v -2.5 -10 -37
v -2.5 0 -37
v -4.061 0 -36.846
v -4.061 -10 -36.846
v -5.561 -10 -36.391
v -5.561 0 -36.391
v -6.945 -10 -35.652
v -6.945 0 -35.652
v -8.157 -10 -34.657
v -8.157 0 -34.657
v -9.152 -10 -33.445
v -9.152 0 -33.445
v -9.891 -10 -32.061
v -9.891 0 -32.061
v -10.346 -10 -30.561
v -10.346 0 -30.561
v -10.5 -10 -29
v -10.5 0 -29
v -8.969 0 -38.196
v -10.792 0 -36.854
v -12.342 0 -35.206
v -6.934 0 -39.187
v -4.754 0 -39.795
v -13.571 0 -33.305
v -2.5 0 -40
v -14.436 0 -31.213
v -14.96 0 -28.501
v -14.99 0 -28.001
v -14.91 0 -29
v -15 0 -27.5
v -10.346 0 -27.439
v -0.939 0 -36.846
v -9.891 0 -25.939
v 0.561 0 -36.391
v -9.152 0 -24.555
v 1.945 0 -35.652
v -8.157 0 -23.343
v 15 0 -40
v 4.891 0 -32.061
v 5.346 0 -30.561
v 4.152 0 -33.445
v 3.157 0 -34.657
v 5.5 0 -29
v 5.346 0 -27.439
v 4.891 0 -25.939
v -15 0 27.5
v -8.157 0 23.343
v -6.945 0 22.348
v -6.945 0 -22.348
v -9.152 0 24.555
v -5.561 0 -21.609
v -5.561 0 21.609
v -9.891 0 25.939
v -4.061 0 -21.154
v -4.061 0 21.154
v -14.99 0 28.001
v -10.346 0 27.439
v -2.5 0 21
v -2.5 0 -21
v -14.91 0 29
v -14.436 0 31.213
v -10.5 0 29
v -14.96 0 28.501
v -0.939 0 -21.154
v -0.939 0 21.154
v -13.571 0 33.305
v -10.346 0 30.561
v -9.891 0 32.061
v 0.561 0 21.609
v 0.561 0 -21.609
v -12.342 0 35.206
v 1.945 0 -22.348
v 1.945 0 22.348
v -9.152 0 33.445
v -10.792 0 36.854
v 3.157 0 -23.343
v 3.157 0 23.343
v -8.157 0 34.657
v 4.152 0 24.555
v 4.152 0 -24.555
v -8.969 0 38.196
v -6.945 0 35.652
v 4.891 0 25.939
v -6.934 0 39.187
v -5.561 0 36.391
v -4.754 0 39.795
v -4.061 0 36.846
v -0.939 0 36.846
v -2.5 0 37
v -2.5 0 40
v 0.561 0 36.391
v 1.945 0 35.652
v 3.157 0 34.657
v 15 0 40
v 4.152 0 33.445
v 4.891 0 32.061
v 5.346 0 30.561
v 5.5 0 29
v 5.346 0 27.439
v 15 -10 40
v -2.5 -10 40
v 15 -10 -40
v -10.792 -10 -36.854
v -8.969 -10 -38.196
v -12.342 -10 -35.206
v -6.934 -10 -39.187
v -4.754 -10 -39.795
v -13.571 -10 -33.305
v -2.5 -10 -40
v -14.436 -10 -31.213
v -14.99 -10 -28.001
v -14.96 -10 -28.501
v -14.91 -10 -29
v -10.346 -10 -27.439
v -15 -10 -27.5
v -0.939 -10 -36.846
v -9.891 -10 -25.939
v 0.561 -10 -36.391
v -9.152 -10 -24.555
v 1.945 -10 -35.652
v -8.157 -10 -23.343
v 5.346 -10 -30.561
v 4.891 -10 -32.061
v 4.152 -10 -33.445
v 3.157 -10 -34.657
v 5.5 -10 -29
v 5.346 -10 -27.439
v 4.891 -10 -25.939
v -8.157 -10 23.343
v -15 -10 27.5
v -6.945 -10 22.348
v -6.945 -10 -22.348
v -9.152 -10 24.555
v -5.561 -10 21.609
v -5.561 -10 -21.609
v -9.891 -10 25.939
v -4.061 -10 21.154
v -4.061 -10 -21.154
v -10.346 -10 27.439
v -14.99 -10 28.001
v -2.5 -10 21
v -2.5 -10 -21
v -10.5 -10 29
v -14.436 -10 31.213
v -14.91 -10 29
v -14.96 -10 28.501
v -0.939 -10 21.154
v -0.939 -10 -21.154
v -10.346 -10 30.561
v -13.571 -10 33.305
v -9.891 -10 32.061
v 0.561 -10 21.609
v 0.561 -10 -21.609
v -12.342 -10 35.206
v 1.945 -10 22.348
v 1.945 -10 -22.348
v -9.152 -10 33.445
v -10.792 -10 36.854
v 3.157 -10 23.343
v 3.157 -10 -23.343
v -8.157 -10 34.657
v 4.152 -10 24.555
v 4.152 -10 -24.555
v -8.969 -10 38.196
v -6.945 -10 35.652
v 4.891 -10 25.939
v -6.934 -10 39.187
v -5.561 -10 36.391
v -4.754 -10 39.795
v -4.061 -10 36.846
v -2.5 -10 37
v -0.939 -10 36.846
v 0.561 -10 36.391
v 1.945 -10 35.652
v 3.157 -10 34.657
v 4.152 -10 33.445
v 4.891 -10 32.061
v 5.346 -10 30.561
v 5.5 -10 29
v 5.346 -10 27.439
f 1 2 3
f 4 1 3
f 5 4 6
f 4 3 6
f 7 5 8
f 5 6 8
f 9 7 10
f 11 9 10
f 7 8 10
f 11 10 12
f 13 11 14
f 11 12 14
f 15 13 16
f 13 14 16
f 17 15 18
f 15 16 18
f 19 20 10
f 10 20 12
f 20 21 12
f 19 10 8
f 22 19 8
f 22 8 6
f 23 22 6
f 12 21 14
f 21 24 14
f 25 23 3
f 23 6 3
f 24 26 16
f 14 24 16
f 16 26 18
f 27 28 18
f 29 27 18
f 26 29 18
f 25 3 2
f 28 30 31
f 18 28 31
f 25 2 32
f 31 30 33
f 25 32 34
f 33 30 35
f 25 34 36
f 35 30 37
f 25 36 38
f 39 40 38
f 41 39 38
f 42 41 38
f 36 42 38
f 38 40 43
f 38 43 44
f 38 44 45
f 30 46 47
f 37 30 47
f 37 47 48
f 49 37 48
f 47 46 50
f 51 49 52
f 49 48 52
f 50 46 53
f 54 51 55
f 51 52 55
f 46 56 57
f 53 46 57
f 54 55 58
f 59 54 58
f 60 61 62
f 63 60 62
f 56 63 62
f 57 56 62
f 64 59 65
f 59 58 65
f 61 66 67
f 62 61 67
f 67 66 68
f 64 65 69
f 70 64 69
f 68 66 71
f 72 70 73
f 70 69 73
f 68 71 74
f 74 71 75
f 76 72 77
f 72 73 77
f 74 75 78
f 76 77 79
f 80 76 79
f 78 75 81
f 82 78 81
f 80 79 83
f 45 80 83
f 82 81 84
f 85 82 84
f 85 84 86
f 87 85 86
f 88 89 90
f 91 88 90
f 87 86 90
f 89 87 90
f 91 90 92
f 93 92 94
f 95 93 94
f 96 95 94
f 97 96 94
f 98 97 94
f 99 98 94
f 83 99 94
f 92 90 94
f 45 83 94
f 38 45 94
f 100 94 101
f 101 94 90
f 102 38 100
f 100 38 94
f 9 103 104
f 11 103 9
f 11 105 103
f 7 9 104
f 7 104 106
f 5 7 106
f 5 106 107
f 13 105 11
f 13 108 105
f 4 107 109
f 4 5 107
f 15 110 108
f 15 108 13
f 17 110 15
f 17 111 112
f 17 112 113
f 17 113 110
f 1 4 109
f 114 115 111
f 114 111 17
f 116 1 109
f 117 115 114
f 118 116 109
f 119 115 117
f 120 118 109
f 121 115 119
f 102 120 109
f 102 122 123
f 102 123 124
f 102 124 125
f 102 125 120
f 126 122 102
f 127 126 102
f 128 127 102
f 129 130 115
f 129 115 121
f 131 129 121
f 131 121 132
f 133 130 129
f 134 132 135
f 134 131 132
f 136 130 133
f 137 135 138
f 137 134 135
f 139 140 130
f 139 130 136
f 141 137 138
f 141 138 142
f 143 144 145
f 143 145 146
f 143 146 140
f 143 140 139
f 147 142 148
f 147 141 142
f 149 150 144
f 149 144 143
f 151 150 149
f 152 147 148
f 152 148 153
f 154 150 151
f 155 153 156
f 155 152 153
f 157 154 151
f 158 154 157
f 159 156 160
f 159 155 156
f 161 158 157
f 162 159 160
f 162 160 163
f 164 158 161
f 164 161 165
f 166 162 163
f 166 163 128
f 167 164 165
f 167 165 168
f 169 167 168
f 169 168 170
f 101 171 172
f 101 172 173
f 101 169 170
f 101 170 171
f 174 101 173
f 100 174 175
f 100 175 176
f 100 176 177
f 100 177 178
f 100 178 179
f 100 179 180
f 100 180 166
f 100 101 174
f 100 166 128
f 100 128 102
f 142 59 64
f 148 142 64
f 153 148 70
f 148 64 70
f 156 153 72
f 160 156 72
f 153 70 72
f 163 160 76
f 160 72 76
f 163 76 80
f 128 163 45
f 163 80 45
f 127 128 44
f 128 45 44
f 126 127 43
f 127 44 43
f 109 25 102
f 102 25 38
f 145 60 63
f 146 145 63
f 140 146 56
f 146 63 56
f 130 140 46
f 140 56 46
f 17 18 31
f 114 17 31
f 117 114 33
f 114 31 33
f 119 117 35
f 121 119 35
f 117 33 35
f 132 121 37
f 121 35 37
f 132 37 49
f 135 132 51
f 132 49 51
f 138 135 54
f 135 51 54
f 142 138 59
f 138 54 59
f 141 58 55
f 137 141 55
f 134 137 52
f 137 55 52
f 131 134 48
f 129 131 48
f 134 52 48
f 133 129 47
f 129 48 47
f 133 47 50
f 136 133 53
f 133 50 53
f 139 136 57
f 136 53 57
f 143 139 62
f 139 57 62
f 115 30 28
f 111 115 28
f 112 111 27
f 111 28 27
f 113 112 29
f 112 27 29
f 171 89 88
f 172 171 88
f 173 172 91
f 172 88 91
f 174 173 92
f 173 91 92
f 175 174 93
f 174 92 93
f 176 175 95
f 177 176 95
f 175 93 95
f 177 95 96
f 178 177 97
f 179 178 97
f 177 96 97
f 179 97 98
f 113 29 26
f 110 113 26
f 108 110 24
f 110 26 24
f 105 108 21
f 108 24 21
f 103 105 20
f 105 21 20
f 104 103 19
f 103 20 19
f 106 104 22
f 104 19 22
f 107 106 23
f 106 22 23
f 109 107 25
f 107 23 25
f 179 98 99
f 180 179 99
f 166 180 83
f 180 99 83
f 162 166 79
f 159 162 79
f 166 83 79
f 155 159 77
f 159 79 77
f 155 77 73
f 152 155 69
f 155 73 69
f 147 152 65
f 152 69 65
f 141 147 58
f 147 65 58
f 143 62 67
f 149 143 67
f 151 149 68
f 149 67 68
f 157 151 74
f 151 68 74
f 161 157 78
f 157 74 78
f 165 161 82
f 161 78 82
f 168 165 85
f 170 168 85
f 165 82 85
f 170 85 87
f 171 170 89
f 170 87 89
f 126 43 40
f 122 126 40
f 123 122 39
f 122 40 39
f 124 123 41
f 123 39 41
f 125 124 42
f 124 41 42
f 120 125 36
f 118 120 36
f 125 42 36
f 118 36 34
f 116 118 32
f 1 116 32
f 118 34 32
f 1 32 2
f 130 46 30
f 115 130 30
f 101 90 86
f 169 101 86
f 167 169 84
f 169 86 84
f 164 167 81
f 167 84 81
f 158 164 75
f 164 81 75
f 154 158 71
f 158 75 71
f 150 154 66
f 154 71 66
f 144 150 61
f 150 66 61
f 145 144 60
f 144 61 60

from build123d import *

# Parameters (mm, degrees)
F1_DEPTH = 10


with BuildPart() as f1:
    # F0 (on Front) → F1 (new body)
    with BuildSketch(Plane.XZ):
        with BuildLine():
            Line((-2.5, -40), (15, -40))
            Line((15, -40), (15, -29))
            Line((15, -29), (5.5, -29))
            ThreePointArc((5.5, -29), (3.156854, -34.656854), (-2.5, -37))
            Line((-2.5, -37), (-2.5, -40))
        make_face()
        with BuildLine():
            ThreePointArc((-14.909674, -29), (-10.791562, -36.854143), (-2.5, -40))
            Line((-2.5, -40), (-2.5, -37))
            ThreePointArc((-2.5, -37), (-8.156854, -34.656854), (-10.5, -29))
            Line((-10.5, -29), (-14.909674, -29))
        make_face()
        with BuildLine():
            Line((5.5, -29), (15, -29))
            Line((15, -29), (15, 29))
            Line((15, 29), (5.5, 29))
            ThreePointArc((5.5, 29), (3.156854, 23.343146), (-2.5, 21))
            Line((-2.5, 21), (-2.5, -21))
            ThreePointArc((-2.5, -21), (3.156854, -23.343146), (5.5, -29))
        make_face()
        with BuildLine():
            ThreePointArc((-15, -27.5), (-14.977398, -28.251359), (-14.909674, -29))
            Line((-14.909674, -29), (-10.5, -29))
            ThreePointArc((-10.5, -29), (-8.156854, -23.343146), (-2.5, -21))
            Line((-2.5, -21), (-2.5, 21))
            ThreePointArc((-2.5, 21), (-8.156854, 23.343146), (-10.5, 29))
            Line((-10.5, 29), (-14.909674, 29))
            ThreePointArc((-14.909674, 29), (-14.977398, 28.251359), (-15, 27.5))
            Line((-15, 27.5), (-15, -27.5))
        make_face()
        with BuildLine():
            Line((5.5, 29), (15, 29))
            Line((15, 29), (15, 40))
            Line((15, 40), (-2.5, 40))
            Line((-2.5, 40), (-2.5, 37))
            ThreePointArc((-2.5, 37), (3.156854, 34.656854), (5.5, 29))
        make_face()
        with BuildLine():
            Line((-2.5, 37), (-2.5, 40))
            ThreePointArc((-2.5, 40), (-10.791562, 36.854143), (-14.909674, 29))
            Line((-14.909674, 29), (-10.5, 29))
            ThreePointArc((-10.5, 29), (-8.156854, 34.656854), (-2.5, 37))
        make_face()
    extrude(amount=F1_DEPTH)


solid = f1.part
